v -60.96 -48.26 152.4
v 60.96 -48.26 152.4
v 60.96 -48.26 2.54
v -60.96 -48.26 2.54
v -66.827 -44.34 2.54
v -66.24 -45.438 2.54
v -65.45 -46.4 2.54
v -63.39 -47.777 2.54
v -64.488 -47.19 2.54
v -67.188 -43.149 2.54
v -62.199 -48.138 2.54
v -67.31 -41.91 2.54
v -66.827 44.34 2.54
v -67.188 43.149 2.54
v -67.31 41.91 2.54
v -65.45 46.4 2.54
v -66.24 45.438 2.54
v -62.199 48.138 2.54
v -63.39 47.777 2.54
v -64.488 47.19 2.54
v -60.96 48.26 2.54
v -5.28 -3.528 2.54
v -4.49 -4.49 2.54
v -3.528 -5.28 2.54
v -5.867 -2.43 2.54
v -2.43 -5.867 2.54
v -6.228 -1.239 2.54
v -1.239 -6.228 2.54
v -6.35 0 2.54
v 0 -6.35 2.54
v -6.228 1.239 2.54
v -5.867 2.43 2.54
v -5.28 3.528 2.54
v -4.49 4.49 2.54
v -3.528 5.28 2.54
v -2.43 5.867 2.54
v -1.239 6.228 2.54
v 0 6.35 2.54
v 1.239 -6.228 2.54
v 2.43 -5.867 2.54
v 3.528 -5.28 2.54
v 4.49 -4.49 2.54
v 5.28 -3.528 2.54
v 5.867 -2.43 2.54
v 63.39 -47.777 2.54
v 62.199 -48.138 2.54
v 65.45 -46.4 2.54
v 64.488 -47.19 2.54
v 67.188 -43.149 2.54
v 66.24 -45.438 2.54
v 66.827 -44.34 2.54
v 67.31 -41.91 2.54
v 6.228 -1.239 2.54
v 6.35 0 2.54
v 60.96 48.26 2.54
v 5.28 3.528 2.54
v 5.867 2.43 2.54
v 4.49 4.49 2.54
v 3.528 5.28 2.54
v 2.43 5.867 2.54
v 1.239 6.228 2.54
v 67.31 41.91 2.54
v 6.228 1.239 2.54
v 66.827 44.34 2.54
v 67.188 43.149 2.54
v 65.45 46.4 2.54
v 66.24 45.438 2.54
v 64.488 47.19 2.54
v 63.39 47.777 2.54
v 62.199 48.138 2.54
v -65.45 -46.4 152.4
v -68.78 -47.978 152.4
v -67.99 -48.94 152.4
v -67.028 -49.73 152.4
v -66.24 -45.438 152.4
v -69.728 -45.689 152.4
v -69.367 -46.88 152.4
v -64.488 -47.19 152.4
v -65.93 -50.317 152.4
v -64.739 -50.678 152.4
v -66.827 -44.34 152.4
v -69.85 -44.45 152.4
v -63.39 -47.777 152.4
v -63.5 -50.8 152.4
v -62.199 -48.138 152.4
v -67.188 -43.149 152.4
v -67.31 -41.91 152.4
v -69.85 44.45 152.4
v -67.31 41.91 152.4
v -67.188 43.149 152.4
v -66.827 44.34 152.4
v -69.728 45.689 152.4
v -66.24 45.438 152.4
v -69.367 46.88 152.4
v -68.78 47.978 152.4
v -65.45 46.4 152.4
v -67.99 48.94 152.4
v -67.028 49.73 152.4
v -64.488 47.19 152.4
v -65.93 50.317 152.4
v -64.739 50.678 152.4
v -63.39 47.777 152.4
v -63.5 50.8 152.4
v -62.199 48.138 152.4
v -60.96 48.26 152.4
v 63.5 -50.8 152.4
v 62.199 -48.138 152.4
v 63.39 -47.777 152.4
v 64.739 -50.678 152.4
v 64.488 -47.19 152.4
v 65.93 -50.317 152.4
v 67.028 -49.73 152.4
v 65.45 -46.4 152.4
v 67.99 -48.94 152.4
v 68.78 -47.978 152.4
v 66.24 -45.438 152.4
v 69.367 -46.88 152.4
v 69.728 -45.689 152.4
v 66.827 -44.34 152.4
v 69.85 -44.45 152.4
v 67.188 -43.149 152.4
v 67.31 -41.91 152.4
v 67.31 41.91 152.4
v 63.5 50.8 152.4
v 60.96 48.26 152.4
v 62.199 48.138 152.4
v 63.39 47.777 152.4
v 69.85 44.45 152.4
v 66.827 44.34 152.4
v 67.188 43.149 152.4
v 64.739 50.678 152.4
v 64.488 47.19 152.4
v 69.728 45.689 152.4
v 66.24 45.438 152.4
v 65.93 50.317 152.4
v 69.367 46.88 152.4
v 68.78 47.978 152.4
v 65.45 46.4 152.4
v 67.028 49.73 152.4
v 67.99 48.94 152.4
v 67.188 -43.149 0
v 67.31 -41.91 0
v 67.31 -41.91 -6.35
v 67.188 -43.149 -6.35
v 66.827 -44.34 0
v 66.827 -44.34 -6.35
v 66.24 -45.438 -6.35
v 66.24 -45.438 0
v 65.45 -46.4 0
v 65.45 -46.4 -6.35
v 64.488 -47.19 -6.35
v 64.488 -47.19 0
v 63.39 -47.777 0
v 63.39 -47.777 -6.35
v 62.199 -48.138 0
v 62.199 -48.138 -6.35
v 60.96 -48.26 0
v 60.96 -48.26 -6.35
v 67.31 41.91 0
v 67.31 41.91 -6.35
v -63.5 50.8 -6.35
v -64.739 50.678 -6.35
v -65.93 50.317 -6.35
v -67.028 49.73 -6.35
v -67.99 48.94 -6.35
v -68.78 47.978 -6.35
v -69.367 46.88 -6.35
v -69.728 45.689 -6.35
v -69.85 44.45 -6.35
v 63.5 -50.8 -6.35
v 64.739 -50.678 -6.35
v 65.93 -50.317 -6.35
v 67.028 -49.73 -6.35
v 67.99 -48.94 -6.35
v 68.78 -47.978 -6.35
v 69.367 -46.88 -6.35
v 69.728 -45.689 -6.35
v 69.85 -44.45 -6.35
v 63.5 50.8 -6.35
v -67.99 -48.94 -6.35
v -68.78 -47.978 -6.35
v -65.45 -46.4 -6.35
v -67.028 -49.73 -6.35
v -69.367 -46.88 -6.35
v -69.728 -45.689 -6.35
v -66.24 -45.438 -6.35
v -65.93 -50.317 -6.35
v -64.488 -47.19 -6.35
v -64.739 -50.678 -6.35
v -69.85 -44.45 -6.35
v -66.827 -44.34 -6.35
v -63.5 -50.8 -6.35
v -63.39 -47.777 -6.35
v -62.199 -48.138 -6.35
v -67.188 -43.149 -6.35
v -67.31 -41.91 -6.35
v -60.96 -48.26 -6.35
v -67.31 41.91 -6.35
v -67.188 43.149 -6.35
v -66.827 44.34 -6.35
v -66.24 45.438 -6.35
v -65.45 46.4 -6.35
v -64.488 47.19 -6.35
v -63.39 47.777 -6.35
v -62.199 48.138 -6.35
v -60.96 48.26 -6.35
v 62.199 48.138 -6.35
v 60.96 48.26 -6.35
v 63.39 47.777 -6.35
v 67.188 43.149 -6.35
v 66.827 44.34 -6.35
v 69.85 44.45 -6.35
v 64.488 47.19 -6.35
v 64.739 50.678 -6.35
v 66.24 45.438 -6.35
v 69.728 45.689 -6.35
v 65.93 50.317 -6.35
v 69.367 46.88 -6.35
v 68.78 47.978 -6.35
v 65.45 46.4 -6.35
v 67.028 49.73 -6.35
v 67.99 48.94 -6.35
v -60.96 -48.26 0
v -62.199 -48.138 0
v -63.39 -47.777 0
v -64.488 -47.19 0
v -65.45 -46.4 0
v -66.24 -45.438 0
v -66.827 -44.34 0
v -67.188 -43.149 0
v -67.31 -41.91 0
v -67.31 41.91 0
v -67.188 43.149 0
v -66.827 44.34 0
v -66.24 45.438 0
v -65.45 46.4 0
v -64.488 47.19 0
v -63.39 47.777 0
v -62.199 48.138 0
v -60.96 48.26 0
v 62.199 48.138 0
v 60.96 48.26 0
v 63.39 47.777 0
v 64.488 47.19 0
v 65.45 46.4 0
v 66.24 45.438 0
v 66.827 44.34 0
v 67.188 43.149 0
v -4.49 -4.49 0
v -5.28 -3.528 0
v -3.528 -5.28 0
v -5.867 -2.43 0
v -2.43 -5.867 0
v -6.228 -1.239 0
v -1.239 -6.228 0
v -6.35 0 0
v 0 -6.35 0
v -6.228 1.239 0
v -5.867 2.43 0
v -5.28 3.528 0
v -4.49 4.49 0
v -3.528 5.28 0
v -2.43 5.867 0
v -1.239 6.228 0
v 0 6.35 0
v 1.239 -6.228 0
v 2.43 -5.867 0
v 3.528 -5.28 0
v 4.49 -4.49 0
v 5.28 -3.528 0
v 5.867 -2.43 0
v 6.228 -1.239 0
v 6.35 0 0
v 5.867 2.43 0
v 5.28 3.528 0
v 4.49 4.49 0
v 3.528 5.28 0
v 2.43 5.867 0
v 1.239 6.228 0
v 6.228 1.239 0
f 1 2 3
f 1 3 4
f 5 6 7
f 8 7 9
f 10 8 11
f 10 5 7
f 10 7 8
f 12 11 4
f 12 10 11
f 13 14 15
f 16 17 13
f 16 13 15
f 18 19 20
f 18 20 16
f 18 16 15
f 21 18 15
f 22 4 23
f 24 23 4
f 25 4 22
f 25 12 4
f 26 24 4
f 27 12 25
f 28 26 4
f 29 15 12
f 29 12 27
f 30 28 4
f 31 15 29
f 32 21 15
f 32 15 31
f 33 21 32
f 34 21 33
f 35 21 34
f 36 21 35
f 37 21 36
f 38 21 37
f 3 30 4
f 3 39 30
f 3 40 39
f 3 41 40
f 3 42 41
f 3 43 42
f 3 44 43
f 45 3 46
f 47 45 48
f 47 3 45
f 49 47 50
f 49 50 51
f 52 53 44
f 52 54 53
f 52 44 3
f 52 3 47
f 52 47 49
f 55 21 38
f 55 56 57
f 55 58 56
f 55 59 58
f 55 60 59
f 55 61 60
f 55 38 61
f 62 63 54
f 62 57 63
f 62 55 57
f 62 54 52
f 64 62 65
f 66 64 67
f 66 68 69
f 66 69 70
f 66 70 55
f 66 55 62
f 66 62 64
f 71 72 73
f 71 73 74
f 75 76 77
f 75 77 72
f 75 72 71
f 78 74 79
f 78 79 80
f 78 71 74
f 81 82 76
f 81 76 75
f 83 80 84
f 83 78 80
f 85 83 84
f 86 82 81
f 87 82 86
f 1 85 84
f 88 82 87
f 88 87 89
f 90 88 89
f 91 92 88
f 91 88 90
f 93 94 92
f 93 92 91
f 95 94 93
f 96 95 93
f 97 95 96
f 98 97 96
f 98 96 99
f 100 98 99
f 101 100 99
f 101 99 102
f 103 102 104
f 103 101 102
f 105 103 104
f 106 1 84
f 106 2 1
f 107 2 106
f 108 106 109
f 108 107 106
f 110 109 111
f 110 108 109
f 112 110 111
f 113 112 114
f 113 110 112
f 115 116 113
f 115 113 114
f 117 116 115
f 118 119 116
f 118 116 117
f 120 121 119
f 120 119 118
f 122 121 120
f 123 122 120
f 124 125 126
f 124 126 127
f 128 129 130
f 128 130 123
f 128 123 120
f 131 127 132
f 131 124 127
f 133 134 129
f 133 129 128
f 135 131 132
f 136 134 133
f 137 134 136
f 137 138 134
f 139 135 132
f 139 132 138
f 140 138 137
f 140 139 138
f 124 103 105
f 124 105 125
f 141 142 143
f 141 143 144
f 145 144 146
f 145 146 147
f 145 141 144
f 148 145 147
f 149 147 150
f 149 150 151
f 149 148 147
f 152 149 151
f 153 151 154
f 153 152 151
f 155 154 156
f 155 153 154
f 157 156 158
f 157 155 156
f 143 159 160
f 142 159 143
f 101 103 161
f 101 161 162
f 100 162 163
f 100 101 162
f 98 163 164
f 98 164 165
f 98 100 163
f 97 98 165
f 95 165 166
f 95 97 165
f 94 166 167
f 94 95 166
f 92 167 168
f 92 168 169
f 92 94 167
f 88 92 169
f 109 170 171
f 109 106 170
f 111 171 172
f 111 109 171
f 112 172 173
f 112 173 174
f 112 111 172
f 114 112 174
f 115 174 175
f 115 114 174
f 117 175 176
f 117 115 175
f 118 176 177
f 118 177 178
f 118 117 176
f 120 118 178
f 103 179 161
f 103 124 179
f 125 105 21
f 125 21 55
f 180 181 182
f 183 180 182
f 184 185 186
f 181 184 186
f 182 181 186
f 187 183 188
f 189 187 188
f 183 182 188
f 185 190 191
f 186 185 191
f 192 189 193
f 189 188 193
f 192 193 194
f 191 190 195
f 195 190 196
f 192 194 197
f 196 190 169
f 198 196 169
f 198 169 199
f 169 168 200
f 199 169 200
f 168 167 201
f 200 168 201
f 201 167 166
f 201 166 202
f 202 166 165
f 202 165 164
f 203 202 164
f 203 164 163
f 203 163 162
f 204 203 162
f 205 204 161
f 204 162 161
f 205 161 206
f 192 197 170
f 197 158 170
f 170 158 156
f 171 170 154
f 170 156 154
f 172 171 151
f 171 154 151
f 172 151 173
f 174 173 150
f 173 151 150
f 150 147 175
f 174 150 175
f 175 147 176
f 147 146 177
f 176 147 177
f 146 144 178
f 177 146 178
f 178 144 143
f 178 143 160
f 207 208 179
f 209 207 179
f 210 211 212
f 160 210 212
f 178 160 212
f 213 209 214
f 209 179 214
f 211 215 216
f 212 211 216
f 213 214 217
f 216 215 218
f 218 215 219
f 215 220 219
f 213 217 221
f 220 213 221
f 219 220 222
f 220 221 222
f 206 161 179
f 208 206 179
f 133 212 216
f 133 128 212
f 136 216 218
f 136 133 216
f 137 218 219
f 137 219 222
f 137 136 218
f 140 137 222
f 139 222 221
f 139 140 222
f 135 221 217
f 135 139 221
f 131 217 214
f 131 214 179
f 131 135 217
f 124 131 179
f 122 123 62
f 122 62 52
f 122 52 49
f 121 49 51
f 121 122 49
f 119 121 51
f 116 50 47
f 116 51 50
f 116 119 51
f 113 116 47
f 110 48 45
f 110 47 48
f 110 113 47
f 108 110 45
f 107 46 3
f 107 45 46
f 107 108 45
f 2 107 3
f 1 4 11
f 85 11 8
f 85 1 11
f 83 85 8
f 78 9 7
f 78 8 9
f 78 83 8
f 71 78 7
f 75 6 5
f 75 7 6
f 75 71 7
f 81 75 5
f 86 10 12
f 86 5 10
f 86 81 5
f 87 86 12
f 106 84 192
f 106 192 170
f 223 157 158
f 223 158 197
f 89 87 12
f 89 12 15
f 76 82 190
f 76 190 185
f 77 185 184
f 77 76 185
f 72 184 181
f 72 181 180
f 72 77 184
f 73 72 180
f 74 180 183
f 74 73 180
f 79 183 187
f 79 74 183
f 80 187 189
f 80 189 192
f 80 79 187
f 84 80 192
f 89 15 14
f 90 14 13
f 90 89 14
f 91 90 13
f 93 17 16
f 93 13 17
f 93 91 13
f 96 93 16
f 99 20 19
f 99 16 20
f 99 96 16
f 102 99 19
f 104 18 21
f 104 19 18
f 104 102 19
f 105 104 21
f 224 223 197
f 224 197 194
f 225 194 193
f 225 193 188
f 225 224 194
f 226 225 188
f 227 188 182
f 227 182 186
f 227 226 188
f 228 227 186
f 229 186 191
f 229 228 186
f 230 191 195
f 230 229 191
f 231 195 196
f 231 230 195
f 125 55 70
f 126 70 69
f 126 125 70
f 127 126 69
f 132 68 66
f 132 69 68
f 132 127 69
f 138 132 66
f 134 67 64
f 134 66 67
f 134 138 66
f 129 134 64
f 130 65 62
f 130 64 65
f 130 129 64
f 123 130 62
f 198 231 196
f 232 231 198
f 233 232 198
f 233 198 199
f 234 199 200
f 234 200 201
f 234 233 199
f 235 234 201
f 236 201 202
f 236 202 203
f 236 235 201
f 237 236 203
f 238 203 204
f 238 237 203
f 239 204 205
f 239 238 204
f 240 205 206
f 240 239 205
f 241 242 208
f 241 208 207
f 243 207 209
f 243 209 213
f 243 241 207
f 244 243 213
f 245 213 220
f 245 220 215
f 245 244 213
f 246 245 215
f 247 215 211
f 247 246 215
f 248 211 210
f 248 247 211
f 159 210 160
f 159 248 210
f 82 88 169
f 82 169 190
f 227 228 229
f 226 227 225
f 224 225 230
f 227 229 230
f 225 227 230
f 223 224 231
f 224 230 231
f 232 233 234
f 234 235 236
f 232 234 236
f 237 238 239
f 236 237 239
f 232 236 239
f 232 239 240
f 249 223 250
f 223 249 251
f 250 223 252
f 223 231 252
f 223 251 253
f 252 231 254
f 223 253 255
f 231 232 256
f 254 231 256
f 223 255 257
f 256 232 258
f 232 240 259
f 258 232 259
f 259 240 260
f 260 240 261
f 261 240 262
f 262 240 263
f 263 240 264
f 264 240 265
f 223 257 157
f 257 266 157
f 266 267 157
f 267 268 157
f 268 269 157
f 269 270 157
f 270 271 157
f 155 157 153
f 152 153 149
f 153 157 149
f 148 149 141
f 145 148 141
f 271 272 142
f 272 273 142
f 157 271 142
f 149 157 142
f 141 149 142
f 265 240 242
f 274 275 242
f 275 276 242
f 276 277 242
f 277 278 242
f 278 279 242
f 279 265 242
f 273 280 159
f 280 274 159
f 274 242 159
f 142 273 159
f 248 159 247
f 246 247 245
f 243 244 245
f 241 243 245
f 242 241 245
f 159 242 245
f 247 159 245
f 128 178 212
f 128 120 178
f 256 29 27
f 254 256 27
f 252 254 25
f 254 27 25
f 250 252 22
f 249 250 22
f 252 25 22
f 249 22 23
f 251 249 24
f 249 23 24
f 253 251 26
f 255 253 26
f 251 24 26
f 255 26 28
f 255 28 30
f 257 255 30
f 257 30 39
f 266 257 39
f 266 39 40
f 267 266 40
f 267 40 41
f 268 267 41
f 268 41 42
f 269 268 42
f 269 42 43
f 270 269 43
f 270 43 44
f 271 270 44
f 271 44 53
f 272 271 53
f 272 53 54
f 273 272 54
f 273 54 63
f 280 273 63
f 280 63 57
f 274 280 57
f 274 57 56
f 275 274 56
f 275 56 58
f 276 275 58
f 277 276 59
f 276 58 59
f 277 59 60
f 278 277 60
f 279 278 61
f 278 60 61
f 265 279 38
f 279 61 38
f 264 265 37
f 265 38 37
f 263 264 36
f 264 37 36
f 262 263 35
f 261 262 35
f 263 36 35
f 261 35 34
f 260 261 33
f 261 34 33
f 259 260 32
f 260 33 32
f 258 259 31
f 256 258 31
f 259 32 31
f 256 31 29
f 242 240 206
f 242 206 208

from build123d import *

# Parameters (mm, degrees)
F1_DEPTH = 152.4
F2_DEPTH = 6.35
F3_DEPTH = 2.54
F4_D     = 12.7


with BuildPart() as f1:
    # F0 (on Top) → F1 (new body)
    with BuildSketch(Plane.XY):
        with BuildLine():
            Line((63.5, 50.8), (-63.5, 50.8))
            ThreePointArc((-63.5, 50.8), (-67.990128, 48.940128), (-69.85, 44.45))
            Line((-69.85, 44.45), (-69.85, -44.45))
            ThreePointArc((-69.85, -44.45), (-67.990128, -48.940128), (-63.5, -50.8))
            Line((-63.5, -50.8), (63.5, -50.8))
            ThreePointArc((63.5, -50.8), (67.990128, -48.940128), (69.85, -44.45))
            Line((69.85, -44.45), (69.85, 44.45))
            ThreePointArc((69.85, 44.45), (67.990128, 48.940128), (63.5, 50.8))
        make_face()
        with BuildLine():
            ThreePointArc((-67.31, 41.91), (-65.450128, 46.400128), (-60.96, 48.26))
            Line((-60.96, 48.26), (60.96, 48.26))
            ThreePointArc((60.96, 48.26), (65.450128, 46.400128), (67.31, 41.91))
            Line((67.31, 41.91), (67.31, -41.91))
            ThreePointArc((67.31, -41.91), (65.450128, -46.400128), (60.96, -48.26))
            Line((60.96, -48.26), (-60.96, -48.26))
            ThreePointArc((-60.96, -48.26), (-65.450128, -46.400128), (-67.31, -41.91))
            Line((-67.31, -41.91), (-67.31, 41.91))
        make_face(mode=Mode.SUBTRACT)
    extrude(amount=F1_DEPTH)

    # F0 (on Top) → F2 (join)
    with BuildSketch(Plane.XY):
        with BuildLine():
            Line((63.5, 50.8), (-63.5, 50.8))
            ThreePointArc((-63.5, 50.8), (-67.990128, 48.940128), (-69.85, 44.45))
            Line((-69.85, 44.45), (-69.85, -44.45))
            ThreePointArc((-69.85, -44.45), (-67.990128, -48.940128), (-63.5, -50.8))
            Line((-63.5, -50.8), (63.5, -50.8))
            ThreePointArc((63.5, -50.8), (67.990128, -48.940128), (69.85, -44.45))
            Line((69.85, -44.45), (69.85, 44.45))
            ThreePointArc((69.85, 44.45), (67.990128, 48.940128), (63.5, 50.8))
        make_face()
        with BuildLine():
            ThreePointArc((-67.31, 41.91), (-65.450128, 46.400128), (-60.96, 48.26))
            Line((-60.96, 48.26), (60.96, 48.26))
            ThreePointArc((60.96, 48.26), (65.450128, 46.400128), (67.31, 41.91))
            Line((67.31, 41.91), (67.31, -41.91))
            ThreePointArc((67.31, -41.91), (65.450128, -46.400128), (60.96, -48.26))
            Line((60.96, -48.26), (-60.96, -48.26))
            ThreePointArc((-60.96, -48.26), (-65.450128, -46.400128), (-67.31, -41.91))
            Line((-67.31, -41.91), (-67.31, 41.91))
        make_face(mode=Mode.SUBTRACT)
    extrude(amount=-F2_DEPTH)

    # F0 (on Top) → F3 (join)
    with BuildSketch(Plane.XY):
        with BuildLine():
            Line((60.96, 48.26), (-60.96, 48.26))
            ThreePointArc((-60.96, 48.26), (-65.450128, 46.400128), (-67.31, 41.91))
            Line((-67.31, 41.91), (-67.31, -41.91))
            ThreePointArc((-67.31, -41.91), (-65.450128, -46.400128), (-60.96, -48.26))
            Line((-60.96, -48.26), (60.96, -48.26))
            ThreePointArc((60.96, -48.26), (65.450128, -46.400128), (67.31, -41.91))
            Line((67.31, -41.91), (67.31, 41.91))
            ThreePointArc((67.31, 41.91), (65.450128, 46.400128), (60.96, 48.26))
        make_face()
    extrude(amount=F3_DEPTH)

    # F4 (through all)
    with Locations(Plane(origin=(0, 0, 0), x_dir=(1, 0, 0), z_dir=(0, 0, -1))):
        with Locations((0, 0)):
            Hole(F4_D / 2)


solid = f1.part
